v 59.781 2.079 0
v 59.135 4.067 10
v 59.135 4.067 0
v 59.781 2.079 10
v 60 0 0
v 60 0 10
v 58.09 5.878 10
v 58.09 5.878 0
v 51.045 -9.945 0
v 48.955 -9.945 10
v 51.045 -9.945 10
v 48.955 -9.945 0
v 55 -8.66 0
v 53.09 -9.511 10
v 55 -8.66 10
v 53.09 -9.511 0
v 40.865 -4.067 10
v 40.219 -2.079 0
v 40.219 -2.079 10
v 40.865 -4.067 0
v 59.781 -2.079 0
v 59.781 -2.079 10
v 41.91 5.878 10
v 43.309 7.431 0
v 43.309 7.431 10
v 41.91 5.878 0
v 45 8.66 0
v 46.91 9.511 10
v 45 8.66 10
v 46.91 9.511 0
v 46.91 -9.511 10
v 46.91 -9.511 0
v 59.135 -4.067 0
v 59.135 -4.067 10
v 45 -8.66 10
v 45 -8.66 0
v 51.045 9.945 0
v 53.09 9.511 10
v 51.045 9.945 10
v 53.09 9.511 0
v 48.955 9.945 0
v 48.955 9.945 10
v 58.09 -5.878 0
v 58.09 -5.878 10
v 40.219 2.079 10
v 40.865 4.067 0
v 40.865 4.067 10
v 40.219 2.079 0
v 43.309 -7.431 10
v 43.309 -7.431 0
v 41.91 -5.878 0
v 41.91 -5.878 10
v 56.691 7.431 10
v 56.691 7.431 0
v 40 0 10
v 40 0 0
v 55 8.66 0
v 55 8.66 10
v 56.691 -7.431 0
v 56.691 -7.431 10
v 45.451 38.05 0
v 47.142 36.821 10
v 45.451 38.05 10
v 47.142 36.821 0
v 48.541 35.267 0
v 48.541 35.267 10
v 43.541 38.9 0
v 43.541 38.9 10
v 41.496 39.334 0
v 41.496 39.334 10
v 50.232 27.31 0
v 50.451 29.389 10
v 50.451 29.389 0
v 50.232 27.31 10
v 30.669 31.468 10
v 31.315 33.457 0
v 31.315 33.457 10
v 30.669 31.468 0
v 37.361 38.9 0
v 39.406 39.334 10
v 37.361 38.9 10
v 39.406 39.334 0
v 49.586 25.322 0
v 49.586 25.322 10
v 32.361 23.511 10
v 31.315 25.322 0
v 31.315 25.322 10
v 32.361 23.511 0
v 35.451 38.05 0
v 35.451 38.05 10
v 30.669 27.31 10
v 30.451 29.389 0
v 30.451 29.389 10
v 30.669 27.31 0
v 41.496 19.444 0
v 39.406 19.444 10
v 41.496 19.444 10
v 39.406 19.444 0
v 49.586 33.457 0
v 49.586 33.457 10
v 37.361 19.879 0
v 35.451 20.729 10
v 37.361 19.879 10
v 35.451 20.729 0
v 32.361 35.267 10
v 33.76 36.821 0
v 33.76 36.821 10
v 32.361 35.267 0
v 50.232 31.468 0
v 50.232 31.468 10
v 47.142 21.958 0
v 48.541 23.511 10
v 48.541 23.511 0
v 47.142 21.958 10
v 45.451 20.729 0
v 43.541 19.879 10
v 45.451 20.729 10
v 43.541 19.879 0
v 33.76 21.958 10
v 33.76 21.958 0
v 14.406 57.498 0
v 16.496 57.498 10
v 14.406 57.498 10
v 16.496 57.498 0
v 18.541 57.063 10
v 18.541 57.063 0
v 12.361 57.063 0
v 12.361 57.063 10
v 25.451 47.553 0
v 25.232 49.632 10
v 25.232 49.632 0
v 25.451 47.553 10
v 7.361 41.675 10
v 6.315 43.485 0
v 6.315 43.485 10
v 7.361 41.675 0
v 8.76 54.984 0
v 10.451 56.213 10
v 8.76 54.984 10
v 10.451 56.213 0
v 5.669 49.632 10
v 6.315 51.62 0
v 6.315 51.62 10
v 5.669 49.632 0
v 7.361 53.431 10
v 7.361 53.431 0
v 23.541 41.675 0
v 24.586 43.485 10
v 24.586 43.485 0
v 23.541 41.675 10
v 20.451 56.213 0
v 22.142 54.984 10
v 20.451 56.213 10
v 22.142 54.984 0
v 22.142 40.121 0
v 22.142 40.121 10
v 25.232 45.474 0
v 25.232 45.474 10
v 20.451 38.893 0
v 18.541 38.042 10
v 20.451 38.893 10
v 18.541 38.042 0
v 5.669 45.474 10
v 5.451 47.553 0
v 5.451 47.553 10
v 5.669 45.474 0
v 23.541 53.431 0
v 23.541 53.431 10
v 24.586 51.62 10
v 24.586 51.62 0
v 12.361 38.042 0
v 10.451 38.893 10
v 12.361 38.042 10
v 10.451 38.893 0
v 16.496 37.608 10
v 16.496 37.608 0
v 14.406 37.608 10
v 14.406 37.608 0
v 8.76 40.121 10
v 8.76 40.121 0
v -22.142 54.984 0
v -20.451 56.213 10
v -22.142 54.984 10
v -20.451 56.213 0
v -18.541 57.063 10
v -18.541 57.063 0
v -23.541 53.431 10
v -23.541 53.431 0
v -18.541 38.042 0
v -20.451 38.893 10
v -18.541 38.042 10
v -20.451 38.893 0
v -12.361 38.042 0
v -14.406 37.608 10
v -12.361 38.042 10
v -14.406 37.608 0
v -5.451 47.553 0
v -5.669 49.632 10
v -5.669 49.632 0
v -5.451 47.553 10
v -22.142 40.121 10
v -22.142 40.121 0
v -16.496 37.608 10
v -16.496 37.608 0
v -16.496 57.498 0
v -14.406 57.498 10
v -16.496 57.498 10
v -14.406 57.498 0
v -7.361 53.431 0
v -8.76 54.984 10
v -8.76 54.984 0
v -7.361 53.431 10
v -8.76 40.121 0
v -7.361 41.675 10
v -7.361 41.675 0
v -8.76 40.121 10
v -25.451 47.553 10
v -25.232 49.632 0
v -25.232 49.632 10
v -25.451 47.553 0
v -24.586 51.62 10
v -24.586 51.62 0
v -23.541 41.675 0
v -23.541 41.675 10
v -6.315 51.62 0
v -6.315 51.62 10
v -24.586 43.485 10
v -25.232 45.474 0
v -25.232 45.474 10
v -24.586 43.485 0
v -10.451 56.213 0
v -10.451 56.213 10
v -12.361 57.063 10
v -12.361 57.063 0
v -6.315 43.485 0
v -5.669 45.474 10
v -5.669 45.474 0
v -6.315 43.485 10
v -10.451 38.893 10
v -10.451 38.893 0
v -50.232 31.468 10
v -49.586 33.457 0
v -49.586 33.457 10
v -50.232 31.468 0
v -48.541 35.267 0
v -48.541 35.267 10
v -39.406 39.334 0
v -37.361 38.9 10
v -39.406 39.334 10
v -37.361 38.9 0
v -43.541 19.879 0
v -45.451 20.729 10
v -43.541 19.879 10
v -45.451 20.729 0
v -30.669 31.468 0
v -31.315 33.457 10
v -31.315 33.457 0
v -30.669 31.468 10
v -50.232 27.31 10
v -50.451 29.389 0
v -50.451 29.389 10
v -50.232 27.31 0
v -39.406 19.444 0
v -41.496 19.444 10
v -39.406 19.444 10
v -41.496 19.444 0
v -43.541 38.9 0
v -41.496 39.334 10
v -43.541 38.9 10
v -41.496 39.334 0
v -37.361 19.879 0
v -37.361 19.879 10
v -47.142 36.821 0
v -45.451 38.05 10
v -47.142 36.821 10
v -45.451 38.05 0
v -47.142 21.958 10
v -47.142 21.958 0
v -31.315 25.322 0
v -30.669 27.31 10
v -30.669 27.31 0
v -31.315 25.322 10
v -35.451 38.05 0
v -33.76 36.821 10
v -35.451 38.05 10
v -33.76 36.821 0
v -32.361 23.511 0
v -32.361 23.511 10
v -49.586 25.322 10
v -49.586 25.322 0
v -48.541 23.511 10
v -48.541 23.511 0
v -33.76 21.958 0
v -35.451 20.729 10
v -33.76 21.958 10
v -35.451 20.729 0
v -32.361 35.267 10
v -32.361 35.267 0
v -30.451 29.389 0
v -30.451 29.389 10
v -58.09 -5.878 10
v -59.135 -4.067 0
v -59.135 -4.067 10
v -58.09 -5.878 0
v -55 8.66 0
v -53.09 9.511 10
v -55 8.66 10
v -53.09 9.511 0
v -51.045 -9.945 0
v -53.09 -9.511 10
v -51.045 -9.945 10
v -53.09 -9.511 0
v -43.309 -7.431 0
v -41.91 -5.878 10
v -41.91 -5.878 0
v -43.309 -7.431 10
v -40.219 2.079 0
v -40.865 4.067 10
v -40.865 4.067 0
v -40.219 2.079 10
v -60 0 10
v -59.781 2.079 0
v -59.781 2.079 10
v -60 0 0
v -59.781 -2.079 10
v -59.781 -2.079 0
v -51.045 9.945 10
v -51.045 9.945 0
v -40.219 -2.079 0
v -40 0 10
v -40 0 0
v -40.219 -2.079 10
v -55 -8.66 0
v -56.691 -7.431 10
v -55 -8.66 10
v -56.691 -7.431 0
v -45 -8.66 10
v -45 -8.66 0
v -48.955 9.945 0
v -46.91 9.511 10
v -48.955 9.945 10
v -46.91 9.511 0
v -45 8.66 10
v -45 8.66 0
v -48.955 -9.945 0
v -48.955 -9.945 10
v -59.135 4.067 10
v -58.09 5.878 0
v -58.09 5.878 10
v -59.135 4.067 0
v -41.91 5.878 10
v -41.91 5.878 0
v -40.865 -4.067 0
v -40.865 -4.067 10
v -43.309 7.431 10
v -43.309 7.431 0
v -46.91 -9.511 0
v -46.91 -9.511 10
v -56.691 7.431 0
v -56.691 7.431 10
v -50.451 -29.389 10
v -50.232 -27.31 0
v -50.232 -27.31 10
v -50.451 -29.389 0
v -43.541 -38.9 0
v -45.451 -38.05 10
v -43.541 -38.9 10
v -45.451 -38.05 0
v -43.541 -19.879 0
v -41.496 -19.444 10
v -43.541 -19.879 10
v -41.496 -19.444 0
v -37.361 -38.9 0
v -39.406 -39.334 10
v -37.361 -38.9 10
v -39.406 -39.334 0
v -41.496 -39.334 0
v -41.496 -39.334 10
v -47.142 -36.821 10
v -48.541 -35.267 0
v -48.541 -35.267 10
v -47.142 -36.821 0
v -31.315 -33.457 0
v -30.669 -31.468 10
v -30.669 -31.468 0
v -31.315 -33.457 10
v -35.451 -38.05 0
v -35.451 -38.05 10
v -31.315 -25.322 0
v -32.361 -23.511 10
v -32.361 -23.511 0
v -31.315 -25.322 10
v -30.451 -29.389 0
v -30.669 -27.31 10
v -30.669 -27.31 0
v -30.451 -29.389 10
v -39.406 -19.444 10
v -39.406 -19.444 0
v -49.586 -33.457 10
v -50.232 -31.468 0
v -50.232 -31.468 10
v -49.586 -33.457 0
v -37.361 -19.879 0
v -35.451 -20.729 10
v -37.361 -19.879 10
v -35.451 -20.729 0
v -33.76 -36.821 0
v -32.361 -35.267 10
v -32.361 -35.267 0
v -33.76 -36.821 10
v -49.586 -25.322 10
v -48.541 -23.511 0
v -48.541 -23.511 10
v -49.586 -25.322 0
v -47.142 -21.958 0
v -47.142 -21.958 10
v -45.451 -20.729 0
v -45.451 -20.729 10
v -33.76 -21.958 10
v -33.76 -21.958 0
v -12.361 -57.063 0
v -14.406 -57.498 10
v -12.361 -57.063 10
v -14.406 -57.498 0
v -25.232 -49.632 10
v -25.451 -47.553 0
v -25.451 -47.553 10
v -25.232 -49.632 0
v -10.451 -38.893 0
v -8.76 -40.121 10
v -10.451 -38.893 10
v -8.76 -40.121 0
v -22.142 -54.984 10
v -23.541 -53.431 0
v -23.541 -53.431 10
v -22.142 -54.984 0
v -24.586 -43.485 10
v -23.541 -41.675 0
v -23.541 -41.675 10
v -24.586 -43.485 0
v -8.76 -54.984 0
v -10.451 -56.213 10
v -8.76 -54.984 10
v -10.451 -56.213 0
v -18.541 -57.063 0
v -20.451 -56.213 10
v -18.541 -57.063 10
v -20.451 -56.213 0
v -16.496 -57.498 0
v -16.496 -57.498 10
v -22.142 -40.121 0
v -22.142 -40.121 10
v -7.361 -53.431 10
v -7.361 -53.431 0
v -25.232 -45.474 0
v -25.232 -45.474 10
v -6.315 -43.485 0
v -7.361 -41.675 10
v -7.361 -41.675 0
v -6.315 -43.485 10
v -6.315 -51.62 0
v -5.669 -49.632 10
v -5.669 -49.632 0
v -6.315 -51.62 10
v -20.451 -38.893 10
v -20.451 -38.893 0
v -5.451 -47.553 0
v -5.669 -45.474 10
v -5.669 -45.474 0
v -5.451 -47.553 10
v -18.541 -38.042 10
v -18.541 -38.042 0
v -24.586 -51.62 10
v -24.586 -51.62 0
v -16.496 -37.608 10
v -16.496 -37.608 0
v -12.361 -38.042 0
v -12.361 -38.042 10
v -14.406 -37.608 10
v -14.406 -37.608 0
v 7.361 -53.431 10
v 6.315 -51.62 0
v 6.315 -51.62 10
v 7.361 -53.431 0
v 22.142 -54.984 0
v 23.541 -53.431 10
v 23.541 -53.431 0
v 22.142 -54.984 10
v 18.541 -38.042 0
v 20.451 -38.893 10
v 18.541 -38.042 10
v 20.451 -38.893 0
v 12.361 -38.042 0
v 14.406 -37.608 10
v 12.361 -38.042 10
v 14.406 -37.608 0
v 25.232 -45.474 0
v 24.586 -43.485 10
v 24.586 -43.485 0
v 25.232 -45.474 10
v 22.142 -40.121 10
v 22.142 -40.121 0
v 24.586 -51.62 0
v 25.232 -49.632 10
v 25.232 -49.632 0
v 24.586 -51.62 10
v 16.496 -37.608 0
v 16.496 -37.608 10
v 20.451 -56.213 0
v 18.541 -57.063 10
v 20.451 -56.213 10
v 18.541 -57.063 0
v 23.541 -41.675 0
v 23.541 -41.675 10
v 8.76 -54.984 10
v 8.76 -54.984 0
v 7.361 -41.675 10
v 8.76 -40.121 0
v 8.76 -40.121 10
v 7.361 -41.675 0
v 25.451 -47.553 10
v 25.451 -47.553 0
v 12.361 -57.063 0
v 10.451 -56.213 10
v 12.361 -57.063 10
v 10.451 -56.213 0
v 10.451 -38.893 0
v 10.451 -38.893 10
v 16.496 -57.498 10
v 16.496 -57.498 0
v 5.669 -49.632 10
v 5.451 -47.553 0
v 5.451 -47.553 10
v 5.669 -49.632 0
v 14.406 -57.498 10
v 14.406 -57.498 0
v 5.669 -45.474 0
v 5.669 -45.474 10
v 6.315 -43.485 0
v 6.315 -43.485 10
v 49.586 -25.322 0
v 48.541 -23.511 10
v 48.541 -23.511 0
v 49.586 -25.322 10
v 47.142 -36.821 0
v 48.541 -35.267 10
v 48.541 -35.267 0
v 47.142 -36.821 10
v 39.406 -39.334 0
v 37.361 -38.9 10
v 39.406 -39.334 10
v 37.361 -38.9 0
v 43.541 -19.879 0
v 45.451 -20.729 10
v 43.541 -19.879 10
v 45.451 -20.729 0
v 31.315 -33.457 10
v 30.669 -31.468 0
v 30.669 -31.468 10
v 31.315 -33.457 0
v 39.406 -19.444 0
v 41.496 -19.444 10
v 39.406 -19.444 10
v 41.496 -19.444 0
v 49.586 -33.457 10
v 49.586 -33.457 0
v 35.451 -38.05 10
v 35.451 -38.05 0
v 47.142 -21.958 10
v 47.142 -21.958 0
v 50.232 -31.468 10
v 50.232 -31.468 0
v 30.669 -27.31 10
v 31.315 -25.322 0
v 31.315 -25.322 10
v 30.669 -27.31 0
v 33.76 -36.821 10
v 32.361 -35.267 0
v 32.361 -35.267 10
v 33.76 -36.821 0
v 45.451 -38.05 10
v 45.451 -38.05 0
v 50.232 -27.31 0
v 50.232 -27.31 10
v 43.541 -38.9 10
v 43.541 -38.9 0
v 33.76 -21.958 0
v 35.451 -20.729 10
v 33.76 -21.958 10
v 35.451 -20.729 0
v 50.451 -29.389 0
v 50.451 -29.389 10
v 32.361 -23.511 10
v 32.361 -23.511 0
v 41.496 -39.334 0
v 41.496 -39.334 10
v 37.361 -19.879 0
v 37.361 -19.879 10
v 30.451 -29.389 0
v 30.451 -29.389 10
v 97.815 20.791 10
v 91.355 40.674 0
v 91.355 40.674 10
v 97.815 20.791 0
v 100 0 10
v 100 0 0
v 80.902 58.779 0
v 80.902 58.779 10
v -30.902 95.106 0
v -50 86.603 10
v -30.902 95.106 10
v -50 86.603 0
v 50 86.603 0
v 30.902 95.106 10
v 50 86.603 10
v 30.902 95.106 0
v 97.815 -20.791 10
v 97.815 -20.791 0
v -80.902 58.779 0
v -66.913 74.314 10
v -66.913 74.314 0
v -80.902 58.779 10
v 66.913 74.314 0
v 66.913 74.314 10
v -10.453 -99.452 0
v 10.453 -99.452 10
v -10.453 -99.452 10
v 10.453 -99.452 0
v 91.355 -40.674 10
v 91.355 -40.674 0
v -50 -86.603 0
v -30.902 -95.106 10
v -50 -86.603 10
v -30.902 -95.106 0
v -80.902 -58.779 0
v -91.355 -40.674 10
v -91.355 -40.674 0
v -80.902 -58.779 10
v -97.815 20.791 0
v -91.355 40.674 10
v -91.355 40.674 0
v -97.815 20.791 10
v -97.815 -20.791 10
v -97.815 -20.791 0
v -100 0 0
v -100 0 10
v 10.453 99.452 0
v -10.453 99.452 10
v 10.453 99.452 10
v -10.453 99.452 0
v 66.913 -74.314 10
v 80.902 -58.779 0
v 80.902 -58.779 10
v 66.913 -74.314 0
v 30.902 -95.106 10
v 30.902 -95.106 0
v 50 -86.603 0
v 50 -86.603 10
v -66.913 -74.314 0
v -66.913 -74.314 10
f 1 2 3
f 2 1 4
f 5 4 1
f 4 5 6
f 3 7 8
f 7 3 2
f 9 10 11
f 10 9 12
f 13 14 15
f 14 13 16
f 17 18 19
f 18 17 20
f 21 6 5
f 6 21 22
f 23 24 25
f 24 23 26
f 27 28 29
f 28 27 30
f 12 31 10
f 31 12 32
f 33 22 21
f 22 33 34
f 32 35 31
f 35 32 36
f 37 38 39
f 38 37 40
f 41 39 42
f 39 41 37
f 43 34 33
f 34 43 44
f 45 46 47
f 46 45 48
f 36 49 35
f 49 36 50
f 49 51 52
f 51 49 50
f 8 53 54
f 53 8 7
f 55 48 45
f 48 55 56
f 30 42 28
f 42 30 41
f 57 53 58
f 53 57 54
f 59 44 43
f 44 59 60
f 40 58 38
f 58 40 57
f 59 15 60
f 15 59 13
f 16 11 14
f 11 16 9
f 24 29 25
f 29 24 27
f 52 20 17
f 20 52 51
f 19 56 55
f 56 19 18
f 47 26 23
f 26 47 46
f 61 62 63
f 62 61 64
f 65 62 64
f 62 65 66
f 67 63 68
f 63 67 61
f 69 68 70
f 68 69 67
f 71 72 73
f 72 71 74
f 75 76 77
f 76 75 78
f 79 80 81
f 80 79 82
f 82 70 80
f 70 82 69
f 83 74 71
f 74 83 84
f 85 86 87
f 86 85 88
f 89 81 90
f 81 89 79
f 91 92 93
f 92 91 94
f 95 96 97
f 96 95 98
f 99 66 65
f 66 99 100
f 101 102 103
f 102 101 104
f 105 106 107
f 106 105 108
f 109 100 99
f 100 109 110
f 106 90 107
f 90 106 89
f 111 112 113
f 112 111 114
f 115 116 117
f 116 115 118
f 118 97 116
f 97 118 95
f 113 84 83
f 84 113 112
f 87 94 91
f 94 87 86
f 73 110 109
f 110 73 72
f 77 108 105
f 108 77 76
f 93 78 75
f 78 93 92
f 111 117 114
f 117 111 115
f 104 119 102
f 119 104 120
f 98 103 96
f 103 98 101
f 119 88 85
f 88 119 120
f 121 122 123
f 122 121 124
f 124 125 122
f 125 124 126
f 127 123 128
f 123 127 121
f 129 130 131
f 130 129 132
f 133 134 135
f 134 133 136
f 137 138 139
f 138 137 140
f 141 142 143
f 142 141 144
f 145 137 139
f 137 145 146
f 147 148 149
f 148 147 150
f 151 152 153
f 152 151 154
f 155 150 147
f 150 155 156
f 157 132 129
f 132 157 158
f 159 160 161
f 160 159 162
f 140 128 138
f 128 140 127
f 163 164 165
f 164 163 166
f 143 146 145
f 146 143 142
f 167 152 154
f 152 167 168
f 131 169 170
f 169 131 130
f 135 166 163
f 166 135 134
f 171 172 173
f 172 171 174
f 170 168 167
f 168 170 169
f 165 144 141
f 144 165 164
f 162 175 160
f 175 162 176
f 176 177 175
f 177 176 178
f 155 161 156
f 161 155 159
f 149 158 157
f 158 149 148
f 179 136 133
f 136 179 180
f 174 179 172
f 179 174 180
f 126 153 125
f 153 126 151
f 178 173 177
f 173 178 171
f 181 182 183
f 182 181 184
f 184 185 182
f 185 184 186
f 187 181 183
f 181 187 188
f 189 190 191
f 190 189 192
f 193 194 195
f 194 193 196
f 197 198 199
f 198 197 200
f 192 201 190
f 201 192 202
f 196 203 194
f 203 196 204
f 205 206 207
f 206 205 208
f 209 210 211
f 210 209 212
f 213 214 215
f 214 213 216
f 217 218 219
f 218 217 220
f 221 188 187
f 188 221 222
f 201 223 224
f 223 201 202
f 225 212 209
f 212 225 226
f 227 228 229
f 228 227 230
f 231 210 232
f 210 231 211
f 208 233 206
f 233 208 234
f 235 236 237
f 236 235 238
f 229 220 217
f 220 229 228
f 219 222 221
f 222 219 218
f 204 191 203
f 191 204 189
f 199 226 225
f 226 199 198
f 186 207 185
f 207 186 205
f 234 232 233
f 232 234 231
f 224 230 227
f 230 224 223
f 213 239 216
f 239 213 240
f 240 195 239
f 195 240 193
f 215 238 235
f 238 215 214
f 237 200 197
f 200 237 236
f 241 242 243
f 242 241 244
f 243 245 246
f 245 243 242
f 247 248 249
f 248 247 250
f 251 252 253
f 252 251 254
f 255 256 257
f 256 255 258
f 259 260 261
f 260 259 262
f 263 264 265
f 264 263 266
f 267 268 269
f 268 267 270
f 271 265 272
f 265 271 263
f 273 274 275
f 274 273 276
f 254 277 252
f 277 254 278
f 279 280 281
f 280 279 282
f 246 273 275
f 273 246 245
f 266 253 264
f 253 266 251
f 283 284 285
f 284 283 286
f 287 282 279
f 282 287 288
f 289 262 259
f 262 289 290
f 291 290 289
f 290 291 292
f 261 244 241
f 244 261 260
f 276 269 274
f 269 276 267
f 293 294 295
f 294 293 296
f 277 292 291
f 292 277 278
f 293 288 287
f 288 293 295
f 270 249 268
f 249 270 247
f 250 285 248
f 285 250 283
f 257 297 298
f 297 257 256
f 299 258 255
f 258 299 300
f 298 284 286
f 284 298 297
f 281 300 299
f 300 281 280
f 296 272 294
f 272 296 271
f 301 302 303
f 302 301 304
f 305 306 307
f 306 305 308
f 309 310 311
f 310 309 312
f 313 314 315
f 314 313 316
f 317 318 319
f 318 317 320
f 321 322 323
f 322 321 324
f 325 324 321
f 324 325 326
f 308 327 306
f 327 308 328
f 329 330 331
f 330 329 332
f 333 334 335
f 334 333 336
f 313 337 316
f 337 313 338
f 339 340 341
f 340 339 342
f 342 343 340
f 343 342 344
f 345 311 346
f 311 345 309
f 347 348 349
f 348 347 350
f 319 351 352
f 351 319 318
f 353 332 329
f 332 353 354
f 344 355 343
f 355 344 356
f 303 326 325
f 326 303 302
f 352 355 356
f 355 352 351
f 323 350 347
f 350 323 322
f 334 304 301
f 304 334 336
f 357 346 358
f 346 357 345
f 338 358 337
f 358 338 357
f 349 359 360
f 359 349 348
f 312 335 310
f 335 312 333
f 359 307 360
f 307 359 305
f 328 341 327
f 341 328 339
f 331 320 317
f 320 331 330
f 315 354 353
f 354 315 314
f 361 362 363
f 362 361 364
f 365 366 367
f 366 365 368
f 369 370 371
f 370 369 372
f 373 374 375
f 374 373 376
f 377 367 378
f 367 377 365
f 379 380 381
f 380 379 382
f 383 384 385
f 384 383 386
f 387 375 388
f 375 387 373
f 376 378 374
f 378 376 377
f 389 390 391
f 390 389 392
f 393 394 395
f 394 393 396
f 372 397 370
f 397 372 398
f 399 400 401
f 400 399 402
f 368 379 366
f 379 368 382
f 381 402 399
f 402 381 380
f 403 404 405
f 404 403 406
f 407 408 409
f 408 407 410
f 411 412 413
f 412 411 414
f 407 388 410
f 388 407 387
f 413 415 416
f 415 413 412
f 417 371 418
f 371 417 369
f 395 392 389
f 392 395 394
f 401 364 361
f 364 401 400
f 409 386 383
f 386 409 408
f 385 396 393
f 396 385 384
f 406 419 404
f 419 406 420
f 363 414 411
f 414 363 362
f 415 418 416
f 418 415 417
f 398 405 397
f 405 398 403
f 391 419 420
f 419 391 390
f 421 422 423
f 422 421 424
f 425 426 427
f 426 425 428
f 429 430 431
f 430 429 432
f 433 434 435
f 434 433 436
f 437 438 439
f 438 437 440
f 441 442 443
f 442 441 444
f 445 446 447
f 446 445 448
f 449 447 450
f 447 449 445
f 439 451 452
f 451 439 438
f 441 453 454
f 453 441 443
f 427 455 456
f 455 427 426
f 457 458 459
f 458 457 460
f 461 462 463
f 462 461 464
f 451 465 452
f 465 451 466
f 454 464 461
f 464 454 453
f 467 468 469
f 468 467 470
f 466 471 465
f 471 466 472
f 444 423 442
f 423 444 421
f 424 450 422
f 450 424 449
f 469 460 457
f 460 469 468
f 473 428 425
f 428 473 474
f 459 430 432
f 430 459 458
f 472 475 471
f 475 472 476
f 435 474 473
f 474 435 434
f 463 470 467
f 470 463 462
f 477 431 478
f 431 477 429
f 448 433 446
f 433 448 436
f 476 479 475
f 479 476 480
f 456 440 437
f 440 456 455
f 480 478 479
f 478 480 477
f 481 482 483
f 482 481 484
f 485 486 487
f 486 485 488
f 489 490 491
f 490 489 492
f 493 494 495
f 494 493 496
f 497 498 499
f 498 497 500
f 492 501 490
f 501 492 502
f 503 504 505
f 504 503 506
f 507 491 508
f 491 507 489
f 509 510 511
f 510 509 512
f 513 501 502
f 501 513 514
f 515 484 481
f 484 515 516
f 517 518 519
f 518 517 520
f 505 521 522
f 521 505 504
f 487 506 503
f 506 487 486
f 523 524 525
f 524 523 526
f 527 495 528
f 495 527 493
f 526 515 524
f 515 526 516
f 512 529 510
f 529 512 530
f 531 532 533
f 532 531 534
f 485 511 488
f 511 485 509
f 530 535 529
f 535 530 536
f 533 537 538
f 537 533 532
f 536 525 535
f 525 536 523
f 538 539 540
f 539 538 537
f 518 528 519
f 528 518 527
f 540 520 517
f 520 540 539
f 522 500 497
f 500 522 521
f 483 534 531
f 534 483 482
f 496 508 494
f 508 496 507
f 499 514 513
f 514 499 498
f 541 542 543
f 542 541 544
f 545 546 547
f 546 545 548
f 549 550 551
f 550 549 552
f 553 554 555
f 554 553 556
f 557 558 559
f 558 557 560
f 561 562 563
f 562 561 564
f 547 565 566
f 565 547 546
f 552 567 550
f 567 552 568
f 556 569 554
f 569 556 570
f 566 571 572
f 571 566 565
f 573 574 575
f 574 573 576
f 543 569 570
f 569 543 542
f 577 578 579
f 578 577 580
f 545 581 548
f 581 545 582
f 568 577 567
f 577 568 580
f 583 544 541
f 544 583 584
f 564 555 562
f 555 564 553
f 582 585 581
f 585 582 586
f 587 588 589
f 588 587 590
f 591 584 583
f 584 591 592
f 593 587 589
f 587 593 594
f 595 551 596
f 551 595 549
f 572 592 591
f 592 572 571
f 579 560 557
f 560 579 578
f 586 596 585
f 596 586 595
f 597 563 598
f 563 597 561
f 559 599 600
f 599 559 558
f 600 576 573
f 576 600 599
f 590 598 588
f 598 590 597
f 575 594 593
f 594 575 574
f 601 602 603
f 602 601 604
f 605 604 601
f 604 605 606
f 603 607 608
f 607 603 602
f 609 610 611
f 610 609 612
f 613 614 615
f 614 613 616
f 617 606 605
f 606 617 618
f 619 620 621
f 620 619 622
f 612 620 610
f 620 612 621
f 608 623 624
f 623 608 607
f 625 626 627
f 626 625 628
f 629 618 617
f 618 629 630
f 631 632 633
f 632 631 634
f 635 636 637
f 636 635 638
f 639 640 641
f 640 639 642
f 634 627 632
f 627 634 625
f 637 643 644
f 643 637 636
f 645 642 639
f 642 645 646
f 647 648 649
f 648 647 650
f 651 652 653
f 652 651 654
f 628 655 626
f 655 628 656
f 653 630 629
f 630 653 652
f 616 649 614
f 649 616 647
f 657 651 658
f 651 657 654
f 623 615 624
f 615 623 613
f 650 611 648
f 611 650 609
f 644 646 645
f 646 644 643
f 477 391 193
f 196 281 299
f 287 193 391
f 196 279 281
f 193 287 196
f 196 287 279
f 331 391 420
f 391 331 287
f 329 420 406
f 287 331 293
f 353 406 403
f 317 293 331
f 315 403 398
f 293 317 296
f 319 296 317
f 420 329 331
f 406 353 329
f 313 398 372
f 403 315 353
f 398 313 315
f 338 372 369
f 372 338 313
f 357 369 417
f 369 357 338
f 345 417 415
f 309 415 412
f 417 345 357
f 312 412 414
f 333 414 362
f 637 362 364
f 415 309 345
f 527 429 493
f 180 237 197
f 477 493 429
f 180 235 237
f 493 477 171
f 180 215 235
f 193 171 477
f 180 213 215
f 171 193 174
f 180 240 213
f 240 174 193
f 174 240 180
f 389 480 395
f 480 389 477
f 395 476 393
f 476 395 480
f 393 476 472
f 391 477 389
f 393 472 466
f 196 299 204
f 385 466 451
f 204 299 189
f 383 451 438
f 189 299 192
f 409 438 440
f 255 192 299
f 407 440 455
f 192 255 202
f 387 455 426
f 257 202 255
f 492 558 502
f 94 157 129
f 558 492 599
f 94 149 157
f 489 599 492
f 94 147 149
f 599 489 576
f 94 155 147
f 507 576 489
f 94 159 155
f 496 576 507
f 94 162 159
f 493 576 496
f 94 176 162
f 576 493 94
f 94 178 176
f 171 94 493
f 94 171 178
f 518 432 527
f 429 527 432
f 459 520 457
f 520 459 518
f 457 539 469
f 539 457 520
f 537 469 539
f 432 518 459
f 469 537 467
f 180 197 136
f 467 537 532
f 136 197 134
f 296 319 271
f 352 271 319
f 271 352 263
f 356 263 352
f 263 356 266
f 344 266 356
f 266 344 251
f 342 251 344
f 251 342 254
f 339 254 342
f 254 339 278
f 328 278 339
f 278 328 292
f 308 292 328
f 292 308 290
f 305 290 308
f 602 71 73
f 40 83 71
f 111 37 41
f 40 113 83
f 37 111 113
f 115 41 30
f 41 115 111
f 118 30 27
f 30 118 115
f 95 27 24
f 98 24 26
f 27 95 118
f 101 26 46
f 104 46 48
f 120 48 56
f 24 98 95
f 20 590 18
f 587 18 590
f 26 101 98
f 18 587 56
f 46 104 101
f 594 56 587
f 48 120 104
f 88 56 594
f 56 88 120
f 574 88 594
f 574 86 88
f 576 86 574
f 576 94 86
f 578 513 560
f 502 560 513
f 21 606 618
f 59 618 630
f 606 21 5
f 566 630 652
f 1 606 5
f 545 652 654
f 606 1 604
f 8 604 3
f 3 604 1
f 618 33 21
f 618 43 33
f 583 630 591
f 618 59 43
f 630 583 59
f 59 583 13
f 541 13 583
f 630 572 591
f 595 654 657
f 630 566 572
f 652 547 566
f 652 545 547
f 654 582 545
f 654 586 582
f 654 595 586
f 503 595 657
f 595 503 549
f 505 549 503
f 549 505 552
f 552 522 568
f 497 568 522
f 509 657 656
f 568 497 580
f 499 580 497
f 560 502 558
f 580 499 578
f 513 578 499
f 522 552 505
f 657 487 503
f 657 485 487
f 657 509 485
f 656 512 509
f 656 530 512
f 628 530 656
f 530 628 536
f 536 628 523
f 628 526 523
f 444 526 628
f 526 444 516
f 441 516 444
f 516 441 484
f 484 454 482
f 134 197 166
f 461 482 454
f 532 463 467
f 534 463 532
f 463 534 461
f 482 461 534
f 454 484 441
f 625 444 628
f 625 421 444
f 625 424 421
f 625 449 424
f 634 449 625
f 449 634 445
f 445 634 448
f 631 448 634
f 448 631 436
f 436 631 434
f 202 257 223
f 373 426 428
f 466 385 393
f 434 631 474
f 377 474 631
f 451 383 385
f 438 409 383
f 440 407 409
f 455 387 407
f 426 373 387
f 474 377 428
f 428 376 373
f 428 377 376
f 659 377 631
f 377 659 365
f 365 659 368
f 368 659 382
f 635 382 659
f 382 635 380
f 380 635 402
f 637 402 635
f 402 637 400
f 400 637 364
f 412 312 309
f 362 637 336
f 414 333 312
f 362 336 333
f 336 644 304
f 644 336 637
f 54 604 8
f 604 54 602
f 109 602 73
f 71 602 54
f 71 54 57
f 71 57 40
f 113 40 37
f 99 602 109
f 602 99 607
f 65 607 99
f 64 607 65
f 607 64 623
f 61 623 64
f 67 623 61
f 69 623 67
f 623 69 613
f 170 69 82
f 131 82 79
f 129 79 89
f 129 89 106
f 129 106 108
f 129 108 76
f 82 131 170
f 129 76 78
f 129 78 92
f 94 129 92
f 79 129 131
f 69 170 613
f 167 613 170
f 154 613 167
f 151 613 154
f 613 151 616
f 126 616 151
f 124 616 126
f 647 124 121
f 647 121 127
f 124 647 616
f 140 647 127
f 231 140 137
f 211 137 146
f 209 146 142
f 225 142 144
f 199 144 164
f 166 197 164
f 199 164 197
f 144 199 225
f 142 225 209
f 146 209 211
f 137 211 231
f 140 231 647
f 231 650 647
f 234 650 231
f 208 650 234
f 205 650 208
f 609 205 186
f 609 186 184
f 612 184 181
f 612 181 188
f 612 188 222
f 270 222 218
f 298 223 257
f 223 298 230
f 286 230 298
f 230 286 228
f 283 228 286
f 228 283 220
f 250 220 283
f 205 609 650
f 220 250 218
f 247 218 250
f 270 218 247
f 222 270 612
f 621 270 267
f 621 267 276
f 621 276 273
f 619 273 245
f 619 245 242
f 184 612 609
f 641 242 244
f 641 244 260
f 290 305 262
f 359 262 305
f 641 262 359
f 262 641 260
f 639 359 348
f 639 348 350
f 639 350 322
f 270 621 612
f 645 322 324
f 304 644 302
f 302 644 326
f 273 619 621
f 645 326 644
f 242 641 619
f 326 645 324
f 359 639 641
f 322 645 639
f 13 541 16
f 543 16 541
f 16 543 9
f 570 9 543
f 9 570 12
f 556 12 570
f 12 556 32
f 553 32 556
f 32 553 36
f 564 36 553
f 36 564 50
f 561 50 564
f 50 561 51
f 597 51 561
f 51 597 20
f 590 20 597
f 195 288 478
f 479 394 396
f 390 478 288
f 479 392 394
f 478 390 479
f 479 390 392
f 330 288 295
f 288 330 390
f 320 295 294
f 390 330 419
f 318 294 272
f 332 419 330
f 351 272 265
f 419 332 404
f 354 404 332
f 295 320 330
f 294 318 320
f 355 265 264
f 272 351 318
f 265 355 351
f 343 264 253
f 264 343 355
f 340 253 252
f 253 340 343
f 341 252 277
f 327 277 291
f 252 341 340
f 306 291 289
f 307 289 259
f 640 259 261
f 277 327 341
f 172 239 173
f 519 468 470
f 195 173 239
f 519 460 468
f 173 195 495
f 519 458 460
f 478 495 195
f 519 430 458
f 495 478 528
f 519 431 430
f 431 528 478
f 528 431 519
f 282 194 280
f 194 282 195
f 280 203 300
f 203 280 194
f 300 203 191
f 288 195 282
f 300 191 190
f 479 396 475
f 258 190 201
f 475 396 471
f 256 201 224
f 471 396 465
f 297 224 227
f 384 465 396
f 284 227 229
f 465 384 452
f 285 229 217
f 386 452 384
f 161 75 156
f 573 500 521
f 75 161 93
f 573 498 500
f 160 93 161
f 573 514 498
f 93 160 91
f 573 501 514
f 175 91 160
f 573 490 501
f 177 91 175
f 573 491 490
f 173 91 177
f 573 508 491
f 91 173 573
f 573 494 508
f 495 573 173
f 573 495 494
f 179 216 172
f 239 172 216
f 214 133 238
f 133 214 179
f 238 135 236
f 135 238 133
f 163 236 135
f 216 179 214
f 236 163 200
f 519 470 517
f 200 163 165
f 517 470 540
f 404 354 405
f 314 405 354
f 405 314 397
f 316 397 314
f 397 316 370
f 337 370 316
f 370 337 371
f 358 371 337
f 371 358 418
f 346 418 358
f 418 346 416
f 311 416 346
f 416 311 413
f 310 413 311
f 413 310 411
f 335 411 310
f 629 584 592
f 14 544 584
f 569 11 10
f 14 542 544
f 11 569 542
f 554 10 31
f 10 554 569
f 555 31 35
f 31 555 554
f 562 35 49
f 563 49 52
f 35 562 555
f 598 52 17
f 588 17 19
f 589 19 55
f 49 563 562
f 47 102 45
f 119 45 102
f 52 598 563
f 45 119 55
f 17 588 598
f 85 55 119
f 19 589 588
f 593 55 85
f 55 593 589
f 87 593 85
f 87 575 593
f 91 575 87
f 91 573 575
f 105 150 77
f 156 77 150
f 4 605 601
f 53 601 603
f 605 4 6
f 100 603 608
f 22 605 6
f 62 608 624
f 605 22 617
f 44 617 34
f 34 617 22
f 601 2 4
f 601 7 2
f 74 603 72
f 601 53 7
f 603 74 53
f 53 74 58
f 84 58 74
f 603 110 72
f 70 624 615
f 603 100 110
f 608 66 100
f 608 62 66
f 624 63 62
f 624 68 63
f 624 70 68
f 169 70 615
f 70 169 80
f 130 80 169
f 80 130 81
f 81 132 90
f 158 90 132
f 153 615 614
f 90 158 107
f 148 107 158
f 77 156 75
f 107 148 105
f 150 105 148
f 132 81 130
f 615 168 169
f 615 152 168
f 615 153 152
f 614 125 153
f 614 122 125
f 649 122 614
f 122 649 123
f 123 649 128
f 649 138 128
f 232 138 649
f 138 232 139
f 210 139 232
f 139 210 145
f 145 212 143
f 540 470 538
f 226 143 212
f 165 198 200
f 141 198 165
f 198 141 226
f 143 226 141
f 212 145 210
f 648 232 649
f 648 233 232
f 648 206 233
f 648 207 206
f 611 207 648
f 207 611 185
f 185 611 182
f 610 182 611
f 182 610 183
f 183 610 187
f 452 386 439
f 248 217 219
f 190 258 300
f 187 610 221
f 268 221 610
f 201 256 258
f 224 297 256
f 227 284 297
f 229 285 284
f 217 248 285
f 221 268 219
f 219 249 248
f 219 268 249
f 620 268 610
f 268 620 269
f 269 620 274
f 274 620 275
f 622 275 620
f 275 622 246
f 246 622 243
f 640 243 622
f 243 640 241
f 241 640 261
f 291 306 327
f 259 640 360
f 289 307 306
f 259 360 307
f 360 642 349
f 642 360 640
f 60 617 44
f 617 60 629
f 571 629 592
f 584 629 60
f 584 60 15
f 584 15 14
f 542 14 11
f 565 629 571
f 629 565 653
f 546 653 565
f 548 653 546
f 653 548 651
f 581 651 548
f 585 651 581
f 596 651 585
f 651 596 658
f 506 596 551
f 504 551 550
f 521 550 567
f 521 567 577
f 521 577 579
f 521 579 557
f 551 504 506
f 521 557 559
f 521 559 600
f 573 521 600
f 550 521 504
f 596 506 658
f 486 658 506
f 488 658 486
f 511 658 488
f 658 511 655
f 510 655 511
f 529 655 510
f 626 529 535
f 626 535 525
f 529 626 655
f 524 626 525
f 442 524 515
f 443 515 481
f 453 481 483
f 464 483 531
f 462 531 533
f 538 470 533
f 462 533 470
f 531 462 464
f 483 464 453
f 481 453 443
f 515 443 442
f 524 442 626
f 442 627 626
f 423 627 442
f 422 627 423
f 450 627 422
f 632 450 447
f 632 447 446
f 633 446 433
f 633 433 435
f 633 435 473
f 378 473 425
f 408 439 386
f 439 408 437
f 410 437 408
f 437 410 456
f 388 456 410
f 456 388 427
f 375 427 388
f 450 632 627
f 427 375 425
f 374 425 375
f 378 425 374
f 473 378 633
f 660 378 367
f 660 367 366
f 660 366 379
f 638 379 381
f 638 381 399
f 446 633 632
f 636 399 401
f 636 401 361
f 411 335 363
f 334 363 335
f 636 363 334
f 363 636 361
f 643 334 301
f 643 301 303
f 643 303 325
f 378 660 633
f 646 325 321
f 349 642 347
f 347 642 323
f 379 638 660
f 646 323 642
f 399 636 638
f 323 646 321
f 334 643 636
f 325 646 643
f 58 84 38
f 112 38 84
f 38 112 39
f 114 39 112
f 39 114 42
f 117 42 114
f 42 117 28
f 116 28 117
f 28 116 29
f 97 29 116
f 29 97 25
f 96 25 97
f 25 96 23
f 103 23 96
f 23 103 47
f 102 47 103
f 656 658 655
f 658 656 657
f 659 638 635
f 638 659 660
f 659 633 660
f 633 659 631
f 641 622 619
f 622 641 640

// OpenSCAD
module roata(raza, grosime, raza_gaura, nr_gauri)
{
    difference(){
       cylinder(h = grosime, r = raza);
        for (i = [0 : 360 / nr_gauri: 359])
            rotate([0, 0, i])
           translate([raza / 2, 0, -1])
        cylinder(r = raza_gaura, h = grosime + 2);
   }
}
rotate([0, 0, $t * 360])

roata(raza = 100, grosime = 10, raza_gaura = 10, nr_gauri = 10);
